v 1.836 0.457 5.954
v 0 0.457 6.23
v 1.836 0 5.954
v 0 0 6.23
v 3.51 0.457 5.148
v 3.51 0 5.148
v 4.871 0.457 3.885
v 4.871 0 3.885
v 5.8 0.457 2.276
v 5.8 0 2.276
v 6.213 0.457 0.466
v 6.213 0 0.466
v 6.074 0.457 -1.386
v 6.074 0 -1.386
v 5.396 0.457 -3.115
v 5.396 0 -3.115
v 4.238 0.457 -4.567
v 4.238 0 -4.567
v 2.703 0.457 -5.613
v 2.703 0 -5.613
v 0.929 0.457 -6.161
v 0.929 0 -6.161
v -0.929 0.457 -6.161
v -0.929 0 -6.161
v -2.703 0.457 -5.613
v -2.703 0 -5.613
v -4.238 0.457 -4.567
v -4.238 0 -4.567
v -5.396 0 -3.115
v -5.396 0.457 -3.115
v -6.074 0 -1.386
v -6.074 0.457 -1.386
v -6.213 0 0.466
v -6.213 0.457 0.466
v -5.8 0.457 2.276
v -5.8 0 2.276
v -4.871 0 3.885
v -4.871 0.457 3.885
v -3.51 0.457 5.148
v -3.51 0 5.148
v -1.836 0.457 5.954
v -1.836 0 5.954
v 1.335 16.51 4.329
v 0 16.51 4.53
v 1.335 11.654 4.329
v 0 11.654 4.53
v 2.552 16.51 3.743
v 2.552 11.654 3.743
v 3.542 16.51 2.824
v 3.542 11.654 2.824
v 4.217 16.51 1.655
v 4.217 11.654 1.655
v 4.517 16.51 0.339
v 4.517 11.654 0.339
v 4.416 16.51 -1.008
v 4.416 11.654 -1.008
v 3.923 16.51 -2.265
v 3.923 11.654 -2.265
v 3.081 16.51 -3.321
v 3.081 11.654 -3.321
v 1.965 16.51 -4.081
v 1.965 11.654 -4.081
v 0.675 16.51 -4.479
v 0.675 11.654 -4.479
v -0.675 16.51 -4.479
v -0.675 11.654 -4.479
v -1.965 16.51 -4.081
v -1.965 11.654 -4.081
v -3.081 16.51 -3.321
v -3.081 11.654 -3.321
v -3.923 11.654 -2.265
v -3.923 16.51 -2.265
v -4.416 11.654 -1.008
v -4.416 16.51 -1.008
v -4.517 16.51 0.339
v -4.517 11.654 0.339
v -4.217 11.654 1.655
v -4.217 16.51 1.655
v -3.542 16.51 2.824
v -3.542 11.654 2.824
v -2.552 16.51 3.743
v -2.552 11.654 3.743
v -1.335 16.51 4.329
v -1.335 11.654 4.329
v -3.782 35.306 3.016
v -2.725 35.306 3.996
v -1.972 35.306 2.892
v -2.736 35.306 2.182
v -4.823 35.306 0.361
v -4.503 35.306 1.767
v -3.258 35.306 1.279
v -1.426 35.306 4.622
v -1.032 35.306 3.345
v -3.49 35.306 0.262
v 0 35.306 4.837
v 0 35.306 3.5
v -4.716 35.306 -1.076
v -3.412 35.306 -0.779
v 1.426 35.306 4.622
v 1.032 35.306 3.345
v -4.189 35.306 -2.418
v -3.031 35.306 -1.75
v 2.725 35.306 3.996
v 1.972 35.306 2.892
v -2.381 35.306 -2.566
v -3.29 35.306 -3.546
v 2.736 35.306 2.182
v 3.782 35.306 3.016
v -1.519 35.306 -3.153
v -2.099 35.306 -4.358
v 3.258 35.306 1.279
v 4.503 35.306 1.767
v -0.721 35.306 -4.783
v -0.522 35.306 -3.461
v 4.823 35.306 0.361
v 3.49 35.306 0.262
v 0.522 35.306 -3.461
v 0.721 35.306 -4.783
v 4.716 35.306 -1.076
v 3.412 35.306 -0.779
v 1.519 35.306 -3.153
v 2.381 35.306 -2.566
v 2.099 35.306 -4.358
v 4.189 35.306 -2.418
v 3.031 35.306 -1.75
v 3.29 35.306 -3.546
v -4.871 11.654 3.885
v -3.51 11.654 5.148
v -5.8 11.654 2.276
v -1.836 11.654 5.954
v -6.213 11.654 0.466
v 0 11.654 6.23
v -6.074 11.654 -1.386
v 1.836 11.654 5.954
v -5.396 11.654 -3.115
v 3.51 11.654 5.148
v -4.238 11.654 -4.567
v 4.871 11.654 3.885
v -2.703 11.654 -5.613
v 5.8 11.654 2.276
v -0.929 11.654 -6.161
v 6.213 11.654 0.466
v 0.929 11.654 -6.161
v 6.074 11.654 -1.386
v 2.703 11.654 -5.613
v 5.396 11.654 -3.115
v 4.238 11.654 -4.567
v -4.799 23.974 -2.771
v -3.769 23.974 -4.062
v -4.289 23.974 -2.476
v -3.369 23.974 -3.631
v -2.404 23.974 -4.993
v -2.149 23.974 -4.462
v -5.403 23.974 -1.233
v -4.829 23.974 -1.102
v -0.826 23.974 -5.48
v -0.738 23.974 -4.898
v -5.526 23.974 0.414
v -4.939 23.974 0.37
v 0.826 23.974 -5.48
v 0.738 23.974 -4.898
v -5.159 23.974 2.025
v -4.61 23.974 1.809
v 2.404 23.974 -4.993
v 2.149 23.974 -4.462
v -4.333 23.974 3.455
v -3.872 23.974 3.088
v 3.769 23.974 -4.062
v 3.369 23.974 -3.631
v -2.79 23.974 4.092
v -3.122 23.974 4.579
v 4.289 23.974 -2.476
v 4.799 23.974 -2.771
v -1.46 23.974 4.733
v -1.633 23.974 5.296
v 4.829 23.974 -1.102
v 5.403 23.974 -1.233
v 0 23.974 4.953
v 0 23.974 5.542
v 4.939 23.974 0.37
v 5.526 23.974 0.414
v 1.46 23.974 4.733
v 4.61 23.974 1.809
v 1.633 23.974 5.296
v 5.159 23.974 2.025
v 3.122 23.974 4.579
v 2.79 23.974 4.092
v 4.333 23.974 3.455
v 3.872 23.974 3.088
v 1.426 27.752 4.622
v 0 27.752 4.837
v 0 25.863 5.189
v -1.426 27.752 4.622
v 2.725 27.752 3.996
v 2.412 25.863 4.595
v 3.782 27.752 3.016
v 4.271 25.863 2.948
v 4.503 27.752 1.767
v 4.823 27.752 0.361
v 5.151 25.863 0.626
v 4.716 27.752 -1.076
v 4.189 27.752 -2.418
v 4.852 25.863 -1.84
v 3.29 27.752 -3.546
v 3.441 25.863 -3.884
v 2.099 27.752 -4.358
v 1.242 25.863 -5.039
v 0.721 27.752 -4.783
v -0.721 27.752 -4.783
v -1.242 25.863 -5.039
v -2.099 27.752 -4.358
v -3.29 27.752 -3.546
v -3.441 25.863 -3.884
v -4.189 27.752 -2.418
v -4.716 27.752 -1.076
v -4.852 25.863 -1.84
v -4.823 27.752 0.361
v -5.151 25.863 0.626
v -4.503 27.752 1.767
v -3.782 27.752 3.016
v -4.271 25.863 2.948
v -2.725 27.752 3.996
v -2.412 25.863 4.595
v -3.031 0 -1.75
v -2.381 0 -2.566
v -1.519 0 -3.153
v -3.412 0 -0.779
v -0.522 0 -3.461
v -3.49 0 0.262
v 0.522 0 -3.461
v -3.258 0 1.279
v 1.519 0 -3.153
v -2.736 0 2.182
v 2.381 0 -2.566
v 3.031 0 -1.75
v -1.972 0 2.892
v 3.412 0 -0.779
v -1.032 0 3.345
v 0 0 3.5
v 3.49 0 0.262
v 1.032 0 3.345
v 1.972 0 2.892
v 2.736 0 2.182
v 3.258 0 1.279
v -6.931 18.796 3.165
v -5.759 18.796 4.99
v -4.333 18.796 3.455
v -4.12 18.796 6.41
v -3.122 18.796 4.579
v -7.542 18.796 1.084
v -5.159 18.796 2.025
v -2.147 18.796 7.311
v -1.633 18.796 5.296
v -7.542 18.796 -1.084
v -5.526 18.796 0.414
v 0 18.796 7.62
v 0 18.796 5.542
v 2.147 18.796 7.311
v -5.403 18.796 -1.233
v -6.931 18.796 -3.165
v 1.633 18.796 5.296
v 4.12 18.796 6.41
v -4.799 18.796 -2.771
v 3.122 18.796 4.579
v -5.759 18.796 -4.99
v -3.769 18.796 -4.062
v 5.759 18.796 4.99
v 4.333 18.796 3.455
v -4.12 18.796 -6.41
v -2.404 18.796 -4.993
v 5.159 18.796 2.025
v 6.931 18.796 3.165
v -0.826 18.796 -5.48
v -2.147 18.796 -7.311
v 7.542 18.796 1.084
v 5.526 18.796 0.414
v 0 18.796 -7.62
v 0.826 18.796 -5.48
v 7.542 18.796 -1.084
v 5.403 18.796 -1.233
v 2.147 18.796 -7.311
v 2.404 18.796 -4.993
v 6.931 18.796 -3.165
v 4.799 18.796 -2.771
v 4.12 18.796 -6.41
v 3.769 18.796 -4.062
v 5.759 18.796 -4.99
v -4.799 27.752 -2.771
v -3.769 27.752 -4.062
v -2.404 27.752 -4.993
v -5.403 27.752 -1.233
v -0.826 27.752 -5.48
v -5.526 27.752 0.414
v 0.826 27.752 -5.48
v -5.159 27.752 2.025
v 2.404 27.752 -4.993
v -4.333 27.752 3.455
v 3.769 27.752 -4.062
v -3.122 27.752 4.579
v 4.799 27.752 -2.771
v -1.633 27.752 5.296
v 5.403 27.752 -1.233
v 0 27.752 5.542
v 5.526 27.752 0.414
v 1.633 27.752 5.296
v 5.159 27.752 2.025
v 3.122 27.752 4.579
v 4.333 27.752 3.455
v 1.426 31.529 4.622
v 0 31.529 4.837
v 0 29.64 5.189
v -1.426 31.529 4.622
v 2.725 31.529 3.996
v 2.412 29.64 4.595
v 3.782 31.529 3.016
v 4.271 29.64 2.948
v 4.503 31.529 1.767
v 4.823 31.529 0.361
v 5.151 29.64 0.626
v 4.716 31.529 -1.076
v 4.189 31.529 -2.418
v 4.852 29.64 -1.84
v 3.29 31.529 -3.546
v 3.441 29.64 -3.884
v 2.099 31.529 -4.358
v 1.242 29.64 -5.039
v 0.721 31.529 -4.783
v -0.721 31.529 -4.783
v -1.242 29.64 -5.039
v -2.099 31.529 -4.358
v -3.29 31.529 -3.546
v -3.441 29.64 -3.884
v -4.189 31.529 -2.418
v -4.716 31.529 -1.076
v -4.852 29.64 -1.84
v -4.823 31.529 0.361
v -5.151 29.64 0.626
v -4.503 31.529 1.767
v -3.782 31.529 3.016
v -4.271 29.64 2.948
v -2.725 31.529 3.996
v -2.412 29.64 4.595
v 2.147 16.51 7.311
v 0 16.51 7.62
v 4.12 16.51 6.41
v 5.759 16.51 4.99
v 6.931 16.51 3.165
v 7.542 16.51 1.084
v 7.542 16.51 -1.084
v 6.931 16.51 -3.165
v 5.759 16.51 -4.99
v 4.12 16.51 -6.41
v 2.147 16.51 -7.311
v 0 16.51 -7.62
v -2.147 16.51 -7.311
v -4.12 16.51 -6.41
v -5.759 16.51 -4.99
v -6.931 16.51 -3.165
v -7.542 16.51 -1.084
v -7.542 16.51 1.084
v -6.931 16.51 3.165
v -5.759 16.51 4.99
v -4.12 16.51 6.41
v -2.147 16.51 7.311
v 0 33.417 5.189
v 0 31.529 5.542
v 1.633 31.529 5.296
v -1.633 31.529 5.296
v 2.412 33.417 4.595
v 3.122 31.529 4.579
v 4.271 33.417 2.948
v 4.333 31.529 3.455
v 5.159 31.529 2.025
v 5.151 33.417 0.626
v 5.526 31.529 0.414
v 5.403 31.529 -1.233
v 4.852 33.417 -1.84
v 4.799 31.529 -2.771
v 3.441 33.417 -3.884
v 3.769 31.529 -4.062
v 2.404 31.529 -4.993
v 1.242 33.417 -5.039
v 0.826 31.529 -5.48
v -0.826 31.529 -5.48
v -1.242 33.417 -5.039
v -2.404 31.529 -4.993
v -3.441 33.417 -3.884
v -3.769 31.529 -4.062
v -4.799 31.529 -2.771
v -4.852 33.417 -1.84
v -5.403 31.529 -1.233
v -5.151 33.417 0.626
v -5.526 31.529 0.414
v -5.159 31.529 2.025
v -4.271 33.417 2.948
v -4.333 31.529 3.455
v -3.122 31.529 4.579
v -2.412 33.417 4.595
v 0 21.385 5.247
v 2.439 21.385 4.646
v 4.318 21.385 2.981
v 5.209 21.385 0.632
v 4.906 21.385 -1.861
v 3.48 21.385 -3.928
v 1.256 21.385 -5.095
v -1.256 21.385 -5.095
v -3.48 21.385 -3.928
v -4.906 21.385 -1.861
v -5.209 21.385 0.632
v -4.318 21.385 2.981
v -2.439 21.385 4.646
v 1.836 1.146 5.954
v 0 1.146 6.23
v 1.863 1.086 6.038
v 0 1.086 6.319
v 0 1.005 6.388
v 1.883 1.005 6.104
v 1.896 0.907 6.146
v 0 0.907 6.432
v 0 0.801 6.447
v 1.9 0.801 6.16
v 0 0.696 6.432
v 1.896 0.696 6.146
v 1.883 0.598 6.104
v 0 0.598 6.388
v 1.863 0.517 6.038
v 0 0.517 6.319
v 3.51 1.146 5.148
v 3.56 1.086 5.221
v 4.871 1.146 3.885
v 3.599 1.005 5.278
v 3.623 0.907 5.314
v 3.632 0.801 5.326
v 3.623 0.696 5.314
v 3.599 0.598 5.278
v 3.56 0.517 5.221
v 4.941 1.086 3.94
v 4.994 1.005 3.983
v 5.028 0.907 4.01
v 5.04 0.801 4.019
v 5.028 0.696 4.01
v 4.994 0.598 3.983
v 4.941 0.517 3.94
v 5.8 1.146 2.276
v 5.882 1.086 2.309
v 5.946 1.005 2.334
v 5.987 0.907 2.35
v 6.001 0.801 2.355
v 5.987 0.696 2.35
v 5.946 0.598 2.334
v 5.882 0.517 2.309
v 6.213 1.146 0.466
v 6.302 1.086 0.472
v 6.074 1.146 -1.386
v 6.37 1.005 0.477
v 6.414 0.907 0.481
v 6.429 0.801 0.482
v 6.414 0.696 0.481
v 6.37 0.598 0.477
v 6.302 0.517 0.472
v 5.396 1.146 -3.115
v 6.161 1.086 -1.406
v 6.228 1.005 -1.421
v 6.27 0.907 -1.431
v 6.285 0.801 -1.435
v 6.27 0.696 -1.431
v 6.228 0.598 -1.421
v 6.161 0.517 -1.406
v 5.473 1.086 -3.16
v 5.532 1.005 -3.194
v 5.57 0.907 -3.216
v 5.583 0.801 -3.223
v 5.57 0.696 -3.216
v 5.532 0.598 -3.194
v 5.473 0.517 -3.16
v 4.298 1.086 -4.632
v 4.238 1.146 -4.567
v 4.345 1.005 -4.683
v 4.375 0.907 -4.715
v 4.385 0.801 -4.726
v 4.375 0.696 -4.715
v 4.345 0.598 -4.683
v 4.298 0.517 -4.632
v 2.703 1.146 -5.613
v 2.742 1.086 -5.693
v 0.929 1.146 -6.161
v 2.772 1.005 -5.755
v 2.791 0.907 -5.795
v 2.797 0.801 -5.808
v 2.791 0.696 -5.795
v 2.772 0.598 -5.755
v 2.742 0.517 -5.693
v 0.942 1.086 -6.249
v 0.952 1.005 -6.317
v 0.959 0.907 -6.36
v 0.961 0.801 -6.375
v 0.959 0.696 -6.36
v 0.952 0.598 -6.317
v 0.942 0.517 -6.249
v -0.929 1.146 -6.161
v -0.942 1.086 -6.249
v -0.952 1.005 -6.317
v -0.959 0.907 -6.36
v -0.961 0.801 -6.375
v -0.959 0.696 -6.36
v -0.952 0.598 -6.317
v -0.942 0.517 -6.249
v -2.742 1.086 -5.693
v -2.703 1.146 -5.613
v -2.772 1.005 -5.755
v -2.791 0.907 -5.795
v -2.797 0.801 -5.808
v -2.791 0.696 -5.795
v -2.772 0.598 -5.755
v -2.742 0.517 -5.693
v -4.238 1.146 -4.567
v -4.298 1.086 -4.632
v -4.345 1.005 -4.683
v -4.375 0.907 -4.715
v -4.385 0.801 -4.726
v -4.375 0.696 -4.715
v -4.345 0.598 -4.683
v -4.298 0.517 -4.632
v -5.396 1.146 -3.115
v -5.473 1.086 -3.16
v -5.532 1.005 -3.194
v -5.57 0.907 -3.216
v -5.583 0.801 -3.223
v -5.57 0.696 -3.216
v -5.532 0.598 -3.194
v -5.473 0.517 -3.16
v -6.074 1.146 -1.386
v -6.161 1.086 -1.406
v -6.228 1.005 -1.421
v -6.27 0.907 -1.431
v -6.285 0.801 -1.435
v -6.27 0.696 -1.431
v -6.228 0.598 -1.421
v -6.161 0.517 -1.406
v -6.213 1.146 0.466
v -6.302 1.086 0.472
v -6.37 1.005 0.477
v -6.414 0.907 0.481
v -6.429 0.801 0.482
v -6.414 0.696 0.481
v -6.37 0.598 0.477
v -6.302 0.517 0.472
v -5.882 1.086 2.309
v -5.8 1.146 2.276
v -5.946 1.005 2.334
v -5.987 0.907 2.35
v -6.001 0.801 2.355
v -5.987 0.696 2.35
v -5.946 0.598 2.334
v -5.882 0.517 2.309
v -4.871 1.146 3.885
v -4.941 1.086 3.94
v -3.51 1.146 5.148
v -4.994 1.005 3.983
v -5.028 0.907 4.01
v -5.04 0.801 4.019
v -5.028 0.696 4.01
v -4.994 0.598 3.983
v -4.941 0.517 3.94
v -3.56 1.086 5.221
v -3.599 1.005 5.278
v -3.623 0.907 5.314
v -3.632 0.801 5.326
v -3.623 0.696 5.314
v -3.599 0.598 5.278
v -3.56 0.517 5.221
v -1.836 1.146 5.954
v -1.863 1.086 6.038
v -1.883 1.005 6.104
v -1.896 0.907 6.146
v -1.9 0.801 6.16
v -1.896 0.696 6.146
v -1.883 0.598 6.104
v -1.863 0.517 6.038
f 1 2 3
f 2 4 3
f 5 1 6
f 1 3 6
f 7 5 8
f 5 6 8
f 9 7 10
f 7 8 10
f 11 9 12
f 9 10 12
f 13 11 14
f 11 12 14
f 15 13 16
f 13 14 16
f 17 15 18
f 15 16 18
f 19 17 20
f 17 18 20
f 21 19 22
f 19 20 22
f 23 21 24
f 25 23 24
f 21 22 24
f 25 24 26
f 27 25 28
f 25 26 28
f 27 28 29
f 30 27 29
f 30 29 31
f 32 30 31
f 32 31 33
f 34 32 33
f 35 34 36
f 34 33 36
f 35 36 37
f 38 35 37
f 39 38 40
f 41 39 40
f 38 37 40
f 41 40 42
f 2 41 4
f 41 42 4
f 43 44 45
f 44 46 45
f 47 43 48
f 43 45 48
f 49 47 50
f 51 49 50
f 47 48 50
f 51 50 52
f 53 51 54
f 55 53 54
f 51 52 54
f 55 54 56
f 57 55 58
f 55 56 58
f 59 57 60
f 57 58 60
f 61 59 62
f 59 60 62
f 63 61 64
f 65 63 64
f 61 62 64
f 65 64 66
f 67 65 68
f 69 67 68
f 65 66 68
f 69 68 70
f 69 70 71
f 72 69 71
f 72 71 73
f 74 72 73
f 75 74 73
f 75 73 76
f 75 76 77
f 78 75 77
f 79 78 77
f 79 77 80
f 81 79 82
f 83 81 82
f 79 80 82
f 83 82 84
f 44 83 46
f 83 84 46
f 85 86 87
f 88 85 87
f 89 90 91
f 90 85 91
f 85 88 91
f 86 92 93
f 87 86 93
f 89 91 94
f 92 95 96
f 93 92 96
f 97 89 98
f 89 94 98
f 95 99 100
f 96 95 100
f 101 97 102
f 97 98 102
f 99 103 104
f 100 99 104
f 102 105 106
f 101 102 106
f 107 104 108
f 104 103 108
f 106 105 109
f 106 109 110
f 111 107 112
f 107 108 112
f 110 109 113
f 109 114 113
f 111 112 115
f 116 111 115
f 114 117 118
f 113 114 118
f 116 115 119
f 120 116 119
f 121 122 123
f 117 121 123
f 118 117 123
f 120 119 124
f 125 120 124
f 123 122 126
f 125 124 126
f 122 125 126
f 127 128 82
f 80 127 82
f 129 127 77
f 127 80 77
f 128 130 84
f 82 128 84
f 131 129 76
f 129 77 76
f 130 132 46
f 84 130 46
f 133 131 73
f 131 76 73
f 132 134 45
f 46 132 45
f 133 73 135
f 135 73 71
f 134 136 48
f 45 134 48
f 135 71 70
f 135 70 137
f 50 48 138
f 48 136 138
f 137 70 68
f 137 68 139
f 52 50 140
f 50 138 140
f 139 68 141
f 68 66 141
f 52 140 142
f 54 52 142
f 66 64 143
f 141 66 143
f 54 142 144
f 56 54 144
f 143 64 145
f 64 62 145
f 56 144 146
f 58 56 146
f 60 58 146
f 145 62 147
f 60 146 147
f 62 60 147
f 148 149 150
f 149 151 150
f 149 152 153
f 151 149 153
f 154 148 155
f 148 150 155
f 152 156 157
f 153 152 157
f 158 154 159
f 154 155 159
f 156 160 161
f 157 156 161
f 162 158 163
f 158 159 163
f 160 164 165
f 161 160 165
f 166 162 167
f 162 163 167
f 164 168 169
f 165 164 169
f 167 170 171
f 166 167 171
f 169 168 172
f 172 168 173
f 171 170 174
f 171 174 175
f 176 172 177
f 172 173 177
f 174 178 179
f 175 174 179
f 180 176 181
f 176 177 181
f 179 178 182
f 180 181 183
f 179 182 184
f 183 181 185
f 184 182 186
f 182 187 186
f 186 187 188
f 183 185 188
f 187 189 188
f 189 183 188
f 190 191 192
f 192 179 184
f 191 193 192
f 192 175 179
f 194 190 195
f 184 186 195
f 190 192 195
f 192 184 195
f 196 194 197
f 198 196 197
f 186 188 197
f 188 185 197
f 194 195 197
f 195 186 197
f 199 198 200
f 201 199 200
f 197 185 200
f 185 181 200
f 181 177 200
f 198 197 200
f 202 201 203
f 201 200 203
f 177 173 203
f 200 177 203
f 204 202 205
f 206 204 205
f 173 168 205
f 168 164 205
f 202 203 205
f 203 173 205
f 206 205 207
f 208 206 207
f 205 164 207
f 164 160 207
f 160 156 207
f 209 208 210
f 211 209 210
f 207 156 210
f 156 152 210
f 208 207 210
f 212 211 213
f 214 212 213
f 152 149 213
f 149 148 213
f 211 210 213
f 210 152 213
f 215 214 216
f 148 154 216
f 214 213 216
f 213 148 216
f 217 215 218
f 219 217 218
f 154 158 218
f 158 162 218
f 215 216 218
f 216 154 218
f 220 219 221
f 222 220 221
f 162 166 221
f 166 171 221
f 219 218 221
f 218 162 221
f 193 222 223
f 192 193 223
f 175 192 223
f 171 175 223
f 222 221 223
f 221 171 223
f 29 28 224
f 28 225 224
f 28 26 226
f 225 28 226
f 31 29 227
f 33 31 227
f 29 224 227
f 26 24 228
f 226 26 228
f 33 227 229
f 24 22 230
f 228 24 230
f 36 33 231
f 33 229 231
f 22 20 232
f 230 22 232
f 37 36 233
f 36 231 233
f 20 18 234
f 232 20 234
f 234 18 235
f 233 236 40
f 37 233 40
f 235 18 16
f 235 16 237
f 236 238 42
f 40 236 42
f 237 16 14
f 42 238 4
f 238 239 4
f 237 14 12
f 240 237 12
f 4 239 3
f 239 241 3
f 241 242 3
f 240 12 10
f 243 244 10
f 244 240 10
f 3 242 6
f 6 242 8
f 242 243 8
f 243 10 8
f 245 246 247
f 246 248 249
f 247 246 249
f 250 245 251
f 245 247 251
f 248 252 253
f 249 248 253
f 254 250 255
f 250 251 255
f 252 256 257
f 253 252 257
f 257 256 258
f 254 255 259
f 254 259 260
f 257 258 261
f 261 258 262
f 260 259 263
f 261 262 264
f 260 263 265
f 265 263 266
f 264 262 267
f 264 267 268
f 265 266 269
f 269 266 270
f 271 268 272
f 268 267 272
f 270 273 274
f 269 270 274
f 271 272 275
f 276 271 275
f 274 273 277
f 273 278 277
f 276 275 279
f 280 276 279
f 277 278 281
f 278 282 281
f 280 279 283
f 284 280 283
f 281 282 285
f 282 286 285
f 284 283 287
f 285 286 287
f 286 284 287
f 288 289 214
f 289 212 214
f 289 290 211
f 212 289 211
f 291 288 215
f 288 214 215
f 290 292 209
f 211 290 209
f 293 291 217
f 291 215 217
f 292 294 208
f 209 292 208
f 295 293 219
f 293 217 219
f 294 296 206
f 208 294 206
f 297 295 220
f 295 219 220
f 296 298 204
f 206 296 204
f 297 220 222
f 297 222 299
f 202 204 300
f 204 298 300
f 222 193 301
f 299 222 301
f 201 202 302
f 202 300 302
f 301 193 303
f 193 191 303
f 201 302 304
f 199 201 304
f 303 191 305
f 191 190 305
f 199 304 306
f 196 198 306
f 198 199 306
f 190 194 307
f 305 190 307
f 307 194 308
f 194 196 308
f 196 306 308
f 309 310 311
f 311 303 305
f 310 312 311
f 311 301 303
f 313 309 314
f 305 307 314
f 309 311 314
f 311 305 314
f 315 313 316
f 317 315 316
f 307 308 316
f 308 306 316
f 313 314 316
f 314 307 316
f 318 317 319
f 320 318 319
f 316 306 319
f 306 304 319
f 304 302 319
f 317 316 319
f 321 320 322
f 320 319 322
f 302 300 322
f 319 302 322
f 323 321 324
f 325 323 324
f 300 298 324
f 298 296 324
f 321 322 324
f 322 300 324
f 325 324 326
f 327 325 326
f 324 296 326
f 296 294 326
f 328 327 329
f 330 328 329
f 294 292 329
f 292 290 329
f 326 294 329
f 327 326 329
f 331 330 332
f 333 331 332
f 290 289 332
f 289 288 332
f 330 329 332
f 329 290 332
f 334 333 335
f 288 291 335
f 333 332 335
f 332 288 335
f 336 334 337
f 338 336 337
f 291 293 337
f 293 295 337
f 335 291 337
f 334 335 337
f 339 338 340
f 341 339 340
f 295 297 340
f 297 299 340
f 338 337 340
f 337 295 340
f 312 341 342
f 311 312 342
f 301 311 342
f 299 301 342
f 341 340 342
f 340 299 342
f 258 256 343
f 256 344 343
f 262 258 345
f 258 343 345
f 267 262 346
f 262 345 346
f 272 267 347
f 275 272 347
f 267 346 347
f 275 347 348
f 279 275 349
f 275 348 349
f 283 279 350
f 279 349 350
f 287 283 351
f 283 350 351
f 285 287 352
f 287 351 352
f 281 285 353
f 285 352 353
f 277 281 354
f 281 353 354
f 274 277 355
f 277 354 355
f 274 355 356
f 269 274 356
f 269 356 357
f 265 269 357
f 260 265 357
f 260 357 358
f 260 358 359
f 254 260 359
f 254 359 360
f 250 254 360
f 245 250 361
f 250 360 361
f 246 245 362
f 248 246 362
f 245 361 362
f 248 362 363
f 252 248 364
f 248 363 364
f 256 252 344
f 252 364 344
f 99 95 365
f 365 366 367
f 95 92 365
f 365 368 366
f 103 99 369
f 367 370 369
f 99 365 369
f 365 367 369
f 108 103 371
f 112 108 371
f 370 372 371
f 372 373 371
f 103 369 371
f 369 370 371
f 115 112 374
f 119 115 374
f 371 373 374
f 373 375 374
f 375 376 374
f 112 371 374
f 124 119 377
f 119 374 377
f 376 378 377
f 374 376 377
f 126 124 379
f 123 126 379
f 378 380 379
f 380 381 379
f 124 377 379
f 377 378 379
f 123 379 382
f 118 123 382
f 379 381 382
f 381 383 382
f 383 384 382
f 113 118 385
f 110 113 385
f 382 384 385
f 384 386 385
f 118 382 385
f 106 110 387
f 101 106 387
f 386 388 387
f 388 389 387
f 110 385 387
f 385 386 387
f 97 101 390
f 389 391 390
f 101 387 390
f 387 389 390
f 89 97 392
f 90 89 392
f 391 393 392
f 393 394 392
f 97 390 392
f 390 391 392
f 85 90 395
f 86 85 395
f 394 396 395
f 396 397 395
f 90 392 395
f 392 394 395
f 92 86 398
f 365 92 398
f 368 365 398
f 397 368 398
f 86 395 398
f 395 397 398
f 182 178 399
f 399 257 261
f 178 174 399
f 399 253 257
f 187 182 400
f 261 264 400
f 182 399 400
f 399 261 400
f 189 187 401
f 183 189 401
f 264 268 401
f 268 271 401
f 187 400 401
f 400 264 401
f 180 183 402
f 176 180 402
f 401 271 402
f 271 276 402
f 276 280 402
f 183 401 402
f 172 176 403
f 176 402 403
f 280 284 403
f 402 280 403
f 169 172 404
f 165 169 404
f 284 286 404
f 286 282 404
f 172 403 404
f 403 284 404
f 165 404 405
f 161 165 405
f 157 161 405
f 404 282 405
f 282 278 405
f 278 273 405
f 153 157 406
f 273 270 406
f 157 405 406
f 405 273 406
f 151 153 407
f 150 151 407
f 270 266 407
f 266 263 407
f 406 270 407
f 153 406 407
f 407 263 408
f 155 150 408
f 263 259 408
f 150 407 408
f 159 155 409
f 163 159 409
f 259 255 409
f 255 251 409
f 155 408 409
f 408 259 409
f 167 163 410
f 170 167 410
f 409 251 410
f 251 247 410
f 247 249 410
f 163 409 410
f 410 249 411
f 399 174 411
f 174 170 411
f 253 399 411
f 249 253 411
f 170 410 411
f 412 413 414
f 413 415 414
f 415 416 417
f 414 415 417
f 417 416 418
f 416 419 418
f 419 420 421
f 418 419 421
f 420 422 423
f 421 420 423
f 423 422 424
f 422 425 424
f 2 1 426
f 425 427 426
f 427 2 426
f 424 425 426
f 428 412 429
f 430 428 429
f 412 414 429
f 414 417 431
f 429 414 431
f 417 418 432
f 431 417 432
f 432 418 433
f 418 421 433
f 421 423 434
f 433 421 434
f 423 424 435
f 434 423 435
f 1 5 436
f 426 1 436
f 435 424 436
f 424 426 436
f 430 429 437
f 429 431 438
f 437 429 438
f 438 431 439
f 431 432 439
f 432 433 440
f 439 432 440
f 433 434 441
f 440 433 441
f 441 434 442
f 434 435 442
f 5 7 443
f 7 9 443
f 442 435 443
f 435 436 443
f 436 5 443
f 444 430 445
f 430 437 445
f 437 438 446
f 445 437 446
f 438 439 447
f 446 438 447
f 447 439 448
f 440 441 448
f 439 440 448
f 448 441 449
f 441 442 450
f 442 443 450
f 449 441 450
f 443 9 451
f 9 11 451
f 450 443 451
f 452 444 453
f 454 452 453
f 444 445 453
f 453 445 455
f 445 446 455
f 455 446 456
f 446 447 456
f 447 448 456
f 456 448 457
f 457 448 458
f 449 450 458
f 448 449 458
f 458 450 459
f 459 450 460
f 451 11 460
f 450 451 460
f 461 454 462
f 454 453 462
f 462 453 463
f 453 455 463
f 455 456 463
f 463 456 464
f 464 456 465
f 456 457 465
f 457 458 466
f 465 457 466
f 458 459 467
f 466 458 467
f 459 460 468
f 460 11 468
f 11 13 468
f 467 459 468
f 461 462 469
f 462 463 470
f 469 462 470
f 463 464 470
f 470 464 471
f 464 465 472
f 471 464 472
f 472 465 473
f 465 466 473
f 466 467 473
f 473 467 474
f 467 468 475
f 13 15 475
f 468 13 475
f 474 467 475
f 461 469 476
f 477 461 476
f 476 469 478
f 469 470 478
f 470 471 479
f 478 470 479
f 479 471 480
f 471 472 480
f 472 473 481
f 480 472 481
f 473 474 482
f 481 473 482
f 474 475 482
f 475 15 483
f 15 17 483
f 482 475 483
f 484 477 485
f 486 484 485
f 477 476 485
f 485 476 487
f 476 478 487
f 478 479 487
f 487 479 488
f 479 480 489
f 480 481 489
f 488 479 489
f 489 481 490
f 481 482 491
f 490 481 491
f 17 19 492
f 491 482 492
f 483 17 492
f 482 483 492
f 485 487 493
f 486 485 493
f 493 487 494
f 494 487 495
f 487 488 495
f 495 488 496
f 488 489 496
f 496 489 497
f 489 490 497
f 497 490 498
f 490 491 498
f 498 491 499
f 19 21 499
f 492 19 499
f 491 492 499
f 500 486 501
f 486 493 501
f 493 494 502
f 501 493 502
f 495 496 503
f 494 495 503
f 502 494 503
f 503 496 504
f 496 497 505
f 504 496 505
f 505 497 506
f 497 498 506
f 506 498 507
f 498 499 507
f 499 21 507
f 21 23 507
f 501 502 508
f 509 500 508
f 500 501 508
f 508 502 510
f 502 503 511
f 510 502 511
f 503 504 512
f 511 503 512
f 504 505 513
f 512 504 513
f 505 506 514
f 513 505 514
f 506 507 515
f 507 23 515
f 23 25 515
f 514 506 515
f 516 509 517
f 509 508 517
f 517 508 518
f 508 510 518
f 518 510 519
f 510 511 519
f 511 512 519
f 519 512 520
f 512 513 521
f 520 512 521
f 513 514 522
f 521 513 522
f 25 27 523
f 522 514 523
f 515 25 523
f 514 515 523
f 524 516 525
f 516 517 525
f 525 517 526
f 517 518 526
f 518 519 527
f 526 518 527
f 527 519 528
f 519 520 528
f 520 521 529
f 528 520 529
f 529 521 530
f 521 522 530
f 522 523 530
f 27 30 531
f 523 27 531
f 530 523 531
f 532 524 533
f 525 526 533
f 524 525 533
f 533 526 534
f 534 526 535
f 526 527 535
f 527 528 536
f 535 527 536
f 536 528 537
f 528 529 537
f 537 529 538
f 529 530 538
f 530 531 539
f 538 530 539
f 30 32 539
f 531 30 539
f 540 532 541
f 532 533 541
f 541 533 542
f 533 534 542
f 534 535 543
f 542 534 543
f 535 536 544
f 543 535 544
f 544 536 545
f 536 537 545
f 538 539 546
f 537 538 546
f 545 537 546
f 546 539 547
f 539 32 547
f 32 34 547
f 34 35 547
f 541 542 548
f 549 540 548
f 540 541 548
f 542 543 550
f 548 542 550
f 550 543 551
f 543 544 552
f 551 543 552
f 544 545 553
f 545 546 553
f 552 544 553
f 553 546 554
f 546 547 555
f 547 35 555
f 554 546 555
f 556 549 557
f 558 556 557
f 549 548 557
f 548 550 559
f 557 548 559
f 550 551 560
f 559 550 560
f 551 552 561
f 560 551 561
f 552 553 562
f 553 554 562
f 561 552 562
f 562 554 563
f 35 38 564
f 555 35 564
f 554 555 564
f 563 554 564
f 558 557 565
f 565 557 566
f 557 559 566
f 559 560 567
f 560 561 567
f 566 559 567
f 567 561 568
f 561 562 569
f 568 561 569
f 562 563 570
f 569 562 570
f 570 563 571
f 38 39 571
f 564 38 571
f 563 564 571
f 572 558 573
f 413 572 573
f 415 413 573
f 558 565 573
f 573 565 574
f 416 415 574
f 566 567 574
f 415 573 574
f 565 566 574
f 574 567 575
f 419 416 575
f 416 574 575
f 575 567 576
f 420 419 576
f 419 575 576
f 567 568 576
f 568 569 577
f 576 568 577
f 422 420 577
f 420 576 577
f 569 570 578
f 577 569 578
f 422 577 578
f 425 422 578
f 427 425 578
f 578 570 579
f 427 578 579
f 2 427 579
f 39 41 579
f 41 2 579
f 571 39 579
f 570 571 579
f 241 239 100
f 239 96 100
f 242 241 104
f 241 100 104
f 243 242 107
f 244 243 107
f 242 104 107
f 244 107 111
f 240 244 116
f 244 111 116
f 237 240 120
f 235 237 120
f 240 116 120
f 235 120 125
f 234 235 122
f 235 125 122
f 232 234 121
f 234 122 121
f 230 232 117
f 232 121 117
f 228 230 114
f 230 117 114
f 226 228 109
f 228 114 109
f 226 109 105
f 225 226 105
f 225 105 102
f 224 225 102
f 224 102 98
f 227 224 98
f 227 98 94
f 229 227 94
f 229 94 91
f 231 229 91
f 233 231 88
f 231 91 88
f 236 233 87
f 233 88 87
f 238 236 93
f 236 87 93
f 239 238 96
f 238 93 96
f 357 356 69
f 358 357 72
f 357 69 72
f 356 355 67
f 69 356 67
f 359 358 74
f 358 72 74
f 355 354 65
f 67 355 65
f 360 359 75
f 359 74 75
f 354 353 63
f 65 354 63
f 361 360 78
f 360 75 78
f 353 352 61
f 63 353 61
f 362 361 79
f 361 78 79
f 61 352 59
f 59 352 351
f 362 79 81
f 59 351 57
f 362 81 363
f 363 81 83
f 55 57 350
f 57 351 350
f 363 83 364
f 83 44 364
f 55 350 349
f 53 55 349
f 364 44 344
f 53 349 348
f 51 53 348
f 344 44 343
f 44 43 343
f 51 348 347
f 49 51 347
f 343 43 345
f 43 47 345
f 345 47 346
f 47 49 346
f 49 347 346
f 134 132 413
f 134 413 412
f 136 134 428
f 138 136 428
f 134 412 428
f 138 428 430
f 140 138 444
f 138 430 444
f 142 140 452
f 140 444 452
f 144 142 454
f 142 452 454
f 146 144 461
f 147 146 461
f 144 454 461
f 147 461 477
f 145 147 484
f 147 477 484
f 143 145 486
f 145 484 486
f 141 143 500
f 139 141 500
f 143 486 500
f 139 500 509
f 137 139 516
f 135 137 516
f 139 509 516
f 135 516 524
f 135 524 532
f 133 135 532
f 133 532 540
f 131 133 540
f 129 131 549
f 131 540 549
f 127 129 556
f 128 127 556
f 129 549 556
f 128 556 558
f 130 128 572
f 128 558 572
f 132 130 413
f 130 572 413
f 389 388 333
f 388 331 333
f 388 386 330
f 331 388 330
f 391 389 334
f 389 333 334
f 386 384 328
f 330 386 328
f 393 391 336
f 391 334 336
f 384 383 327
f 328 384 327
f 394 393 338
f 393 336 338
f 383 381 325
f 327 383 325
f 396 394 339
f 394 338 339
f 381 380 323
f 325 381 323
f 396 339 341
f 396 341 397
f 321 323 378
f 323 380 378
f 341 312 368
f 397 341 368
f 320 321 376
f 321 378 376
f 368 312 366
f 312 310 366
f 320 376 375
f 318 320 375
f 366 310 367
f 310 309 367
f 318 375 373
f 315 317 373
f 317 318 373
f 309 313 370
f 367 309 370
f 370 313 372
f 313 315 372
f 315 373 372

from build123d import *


with BuildPart() as f1:
    # F0 (on Right) → F1 (revolve)
    with BuildSketch(Plane.YZ):
        with BuildLine():
            Line((0.4572, 6.230392), (0, 6.230392))
            Line((0, 6.230392), (0, 3.5))
            Line((0, 3.5), (35.306, 3.5))
            Line((35.306, 3.5), (35.306, 4.836943))
            Line((35.306, 4.836943), (31.528782, 5.541712))
            Line((31.528782, 5.541712), (31.528782, 4.836943))
            Line((31.528782, 4.836943), (27.751564, 5.541712))
            Line((27.751564, 5.541712), (27.751564, 4.836943))
            Line((27.751564, 4.836943), (23.974346, 5.541712))
            Line((23.974346, 5.541712), (23.974346, 4.952836))
            Line((23.974346, 4.952836), (18.796, 5.541712))
            Line((18.796, 5.541712), (18.796, 7.62))
            Line((18.796, 7.62), (16.51, 7.62))
            Line((16.51, 7.62), (16.51, 4.529946))
            Line((16.51, 4.529946), (11.654421, 4.529946))
            Line((11.654421, 4.529946), (11.654421, 6.230392))
            Line((11.654421, 6.230392), (1.145791, 6.230392))
            ThreePointArc((1.145791, 6.230392), (0.801495, 6.446617), (0.4572, 6.230392))
        make_face()
    revolve(axis=Axis((0, 43.56328, 0), (0, 1, 0)))


solid = f1.part
